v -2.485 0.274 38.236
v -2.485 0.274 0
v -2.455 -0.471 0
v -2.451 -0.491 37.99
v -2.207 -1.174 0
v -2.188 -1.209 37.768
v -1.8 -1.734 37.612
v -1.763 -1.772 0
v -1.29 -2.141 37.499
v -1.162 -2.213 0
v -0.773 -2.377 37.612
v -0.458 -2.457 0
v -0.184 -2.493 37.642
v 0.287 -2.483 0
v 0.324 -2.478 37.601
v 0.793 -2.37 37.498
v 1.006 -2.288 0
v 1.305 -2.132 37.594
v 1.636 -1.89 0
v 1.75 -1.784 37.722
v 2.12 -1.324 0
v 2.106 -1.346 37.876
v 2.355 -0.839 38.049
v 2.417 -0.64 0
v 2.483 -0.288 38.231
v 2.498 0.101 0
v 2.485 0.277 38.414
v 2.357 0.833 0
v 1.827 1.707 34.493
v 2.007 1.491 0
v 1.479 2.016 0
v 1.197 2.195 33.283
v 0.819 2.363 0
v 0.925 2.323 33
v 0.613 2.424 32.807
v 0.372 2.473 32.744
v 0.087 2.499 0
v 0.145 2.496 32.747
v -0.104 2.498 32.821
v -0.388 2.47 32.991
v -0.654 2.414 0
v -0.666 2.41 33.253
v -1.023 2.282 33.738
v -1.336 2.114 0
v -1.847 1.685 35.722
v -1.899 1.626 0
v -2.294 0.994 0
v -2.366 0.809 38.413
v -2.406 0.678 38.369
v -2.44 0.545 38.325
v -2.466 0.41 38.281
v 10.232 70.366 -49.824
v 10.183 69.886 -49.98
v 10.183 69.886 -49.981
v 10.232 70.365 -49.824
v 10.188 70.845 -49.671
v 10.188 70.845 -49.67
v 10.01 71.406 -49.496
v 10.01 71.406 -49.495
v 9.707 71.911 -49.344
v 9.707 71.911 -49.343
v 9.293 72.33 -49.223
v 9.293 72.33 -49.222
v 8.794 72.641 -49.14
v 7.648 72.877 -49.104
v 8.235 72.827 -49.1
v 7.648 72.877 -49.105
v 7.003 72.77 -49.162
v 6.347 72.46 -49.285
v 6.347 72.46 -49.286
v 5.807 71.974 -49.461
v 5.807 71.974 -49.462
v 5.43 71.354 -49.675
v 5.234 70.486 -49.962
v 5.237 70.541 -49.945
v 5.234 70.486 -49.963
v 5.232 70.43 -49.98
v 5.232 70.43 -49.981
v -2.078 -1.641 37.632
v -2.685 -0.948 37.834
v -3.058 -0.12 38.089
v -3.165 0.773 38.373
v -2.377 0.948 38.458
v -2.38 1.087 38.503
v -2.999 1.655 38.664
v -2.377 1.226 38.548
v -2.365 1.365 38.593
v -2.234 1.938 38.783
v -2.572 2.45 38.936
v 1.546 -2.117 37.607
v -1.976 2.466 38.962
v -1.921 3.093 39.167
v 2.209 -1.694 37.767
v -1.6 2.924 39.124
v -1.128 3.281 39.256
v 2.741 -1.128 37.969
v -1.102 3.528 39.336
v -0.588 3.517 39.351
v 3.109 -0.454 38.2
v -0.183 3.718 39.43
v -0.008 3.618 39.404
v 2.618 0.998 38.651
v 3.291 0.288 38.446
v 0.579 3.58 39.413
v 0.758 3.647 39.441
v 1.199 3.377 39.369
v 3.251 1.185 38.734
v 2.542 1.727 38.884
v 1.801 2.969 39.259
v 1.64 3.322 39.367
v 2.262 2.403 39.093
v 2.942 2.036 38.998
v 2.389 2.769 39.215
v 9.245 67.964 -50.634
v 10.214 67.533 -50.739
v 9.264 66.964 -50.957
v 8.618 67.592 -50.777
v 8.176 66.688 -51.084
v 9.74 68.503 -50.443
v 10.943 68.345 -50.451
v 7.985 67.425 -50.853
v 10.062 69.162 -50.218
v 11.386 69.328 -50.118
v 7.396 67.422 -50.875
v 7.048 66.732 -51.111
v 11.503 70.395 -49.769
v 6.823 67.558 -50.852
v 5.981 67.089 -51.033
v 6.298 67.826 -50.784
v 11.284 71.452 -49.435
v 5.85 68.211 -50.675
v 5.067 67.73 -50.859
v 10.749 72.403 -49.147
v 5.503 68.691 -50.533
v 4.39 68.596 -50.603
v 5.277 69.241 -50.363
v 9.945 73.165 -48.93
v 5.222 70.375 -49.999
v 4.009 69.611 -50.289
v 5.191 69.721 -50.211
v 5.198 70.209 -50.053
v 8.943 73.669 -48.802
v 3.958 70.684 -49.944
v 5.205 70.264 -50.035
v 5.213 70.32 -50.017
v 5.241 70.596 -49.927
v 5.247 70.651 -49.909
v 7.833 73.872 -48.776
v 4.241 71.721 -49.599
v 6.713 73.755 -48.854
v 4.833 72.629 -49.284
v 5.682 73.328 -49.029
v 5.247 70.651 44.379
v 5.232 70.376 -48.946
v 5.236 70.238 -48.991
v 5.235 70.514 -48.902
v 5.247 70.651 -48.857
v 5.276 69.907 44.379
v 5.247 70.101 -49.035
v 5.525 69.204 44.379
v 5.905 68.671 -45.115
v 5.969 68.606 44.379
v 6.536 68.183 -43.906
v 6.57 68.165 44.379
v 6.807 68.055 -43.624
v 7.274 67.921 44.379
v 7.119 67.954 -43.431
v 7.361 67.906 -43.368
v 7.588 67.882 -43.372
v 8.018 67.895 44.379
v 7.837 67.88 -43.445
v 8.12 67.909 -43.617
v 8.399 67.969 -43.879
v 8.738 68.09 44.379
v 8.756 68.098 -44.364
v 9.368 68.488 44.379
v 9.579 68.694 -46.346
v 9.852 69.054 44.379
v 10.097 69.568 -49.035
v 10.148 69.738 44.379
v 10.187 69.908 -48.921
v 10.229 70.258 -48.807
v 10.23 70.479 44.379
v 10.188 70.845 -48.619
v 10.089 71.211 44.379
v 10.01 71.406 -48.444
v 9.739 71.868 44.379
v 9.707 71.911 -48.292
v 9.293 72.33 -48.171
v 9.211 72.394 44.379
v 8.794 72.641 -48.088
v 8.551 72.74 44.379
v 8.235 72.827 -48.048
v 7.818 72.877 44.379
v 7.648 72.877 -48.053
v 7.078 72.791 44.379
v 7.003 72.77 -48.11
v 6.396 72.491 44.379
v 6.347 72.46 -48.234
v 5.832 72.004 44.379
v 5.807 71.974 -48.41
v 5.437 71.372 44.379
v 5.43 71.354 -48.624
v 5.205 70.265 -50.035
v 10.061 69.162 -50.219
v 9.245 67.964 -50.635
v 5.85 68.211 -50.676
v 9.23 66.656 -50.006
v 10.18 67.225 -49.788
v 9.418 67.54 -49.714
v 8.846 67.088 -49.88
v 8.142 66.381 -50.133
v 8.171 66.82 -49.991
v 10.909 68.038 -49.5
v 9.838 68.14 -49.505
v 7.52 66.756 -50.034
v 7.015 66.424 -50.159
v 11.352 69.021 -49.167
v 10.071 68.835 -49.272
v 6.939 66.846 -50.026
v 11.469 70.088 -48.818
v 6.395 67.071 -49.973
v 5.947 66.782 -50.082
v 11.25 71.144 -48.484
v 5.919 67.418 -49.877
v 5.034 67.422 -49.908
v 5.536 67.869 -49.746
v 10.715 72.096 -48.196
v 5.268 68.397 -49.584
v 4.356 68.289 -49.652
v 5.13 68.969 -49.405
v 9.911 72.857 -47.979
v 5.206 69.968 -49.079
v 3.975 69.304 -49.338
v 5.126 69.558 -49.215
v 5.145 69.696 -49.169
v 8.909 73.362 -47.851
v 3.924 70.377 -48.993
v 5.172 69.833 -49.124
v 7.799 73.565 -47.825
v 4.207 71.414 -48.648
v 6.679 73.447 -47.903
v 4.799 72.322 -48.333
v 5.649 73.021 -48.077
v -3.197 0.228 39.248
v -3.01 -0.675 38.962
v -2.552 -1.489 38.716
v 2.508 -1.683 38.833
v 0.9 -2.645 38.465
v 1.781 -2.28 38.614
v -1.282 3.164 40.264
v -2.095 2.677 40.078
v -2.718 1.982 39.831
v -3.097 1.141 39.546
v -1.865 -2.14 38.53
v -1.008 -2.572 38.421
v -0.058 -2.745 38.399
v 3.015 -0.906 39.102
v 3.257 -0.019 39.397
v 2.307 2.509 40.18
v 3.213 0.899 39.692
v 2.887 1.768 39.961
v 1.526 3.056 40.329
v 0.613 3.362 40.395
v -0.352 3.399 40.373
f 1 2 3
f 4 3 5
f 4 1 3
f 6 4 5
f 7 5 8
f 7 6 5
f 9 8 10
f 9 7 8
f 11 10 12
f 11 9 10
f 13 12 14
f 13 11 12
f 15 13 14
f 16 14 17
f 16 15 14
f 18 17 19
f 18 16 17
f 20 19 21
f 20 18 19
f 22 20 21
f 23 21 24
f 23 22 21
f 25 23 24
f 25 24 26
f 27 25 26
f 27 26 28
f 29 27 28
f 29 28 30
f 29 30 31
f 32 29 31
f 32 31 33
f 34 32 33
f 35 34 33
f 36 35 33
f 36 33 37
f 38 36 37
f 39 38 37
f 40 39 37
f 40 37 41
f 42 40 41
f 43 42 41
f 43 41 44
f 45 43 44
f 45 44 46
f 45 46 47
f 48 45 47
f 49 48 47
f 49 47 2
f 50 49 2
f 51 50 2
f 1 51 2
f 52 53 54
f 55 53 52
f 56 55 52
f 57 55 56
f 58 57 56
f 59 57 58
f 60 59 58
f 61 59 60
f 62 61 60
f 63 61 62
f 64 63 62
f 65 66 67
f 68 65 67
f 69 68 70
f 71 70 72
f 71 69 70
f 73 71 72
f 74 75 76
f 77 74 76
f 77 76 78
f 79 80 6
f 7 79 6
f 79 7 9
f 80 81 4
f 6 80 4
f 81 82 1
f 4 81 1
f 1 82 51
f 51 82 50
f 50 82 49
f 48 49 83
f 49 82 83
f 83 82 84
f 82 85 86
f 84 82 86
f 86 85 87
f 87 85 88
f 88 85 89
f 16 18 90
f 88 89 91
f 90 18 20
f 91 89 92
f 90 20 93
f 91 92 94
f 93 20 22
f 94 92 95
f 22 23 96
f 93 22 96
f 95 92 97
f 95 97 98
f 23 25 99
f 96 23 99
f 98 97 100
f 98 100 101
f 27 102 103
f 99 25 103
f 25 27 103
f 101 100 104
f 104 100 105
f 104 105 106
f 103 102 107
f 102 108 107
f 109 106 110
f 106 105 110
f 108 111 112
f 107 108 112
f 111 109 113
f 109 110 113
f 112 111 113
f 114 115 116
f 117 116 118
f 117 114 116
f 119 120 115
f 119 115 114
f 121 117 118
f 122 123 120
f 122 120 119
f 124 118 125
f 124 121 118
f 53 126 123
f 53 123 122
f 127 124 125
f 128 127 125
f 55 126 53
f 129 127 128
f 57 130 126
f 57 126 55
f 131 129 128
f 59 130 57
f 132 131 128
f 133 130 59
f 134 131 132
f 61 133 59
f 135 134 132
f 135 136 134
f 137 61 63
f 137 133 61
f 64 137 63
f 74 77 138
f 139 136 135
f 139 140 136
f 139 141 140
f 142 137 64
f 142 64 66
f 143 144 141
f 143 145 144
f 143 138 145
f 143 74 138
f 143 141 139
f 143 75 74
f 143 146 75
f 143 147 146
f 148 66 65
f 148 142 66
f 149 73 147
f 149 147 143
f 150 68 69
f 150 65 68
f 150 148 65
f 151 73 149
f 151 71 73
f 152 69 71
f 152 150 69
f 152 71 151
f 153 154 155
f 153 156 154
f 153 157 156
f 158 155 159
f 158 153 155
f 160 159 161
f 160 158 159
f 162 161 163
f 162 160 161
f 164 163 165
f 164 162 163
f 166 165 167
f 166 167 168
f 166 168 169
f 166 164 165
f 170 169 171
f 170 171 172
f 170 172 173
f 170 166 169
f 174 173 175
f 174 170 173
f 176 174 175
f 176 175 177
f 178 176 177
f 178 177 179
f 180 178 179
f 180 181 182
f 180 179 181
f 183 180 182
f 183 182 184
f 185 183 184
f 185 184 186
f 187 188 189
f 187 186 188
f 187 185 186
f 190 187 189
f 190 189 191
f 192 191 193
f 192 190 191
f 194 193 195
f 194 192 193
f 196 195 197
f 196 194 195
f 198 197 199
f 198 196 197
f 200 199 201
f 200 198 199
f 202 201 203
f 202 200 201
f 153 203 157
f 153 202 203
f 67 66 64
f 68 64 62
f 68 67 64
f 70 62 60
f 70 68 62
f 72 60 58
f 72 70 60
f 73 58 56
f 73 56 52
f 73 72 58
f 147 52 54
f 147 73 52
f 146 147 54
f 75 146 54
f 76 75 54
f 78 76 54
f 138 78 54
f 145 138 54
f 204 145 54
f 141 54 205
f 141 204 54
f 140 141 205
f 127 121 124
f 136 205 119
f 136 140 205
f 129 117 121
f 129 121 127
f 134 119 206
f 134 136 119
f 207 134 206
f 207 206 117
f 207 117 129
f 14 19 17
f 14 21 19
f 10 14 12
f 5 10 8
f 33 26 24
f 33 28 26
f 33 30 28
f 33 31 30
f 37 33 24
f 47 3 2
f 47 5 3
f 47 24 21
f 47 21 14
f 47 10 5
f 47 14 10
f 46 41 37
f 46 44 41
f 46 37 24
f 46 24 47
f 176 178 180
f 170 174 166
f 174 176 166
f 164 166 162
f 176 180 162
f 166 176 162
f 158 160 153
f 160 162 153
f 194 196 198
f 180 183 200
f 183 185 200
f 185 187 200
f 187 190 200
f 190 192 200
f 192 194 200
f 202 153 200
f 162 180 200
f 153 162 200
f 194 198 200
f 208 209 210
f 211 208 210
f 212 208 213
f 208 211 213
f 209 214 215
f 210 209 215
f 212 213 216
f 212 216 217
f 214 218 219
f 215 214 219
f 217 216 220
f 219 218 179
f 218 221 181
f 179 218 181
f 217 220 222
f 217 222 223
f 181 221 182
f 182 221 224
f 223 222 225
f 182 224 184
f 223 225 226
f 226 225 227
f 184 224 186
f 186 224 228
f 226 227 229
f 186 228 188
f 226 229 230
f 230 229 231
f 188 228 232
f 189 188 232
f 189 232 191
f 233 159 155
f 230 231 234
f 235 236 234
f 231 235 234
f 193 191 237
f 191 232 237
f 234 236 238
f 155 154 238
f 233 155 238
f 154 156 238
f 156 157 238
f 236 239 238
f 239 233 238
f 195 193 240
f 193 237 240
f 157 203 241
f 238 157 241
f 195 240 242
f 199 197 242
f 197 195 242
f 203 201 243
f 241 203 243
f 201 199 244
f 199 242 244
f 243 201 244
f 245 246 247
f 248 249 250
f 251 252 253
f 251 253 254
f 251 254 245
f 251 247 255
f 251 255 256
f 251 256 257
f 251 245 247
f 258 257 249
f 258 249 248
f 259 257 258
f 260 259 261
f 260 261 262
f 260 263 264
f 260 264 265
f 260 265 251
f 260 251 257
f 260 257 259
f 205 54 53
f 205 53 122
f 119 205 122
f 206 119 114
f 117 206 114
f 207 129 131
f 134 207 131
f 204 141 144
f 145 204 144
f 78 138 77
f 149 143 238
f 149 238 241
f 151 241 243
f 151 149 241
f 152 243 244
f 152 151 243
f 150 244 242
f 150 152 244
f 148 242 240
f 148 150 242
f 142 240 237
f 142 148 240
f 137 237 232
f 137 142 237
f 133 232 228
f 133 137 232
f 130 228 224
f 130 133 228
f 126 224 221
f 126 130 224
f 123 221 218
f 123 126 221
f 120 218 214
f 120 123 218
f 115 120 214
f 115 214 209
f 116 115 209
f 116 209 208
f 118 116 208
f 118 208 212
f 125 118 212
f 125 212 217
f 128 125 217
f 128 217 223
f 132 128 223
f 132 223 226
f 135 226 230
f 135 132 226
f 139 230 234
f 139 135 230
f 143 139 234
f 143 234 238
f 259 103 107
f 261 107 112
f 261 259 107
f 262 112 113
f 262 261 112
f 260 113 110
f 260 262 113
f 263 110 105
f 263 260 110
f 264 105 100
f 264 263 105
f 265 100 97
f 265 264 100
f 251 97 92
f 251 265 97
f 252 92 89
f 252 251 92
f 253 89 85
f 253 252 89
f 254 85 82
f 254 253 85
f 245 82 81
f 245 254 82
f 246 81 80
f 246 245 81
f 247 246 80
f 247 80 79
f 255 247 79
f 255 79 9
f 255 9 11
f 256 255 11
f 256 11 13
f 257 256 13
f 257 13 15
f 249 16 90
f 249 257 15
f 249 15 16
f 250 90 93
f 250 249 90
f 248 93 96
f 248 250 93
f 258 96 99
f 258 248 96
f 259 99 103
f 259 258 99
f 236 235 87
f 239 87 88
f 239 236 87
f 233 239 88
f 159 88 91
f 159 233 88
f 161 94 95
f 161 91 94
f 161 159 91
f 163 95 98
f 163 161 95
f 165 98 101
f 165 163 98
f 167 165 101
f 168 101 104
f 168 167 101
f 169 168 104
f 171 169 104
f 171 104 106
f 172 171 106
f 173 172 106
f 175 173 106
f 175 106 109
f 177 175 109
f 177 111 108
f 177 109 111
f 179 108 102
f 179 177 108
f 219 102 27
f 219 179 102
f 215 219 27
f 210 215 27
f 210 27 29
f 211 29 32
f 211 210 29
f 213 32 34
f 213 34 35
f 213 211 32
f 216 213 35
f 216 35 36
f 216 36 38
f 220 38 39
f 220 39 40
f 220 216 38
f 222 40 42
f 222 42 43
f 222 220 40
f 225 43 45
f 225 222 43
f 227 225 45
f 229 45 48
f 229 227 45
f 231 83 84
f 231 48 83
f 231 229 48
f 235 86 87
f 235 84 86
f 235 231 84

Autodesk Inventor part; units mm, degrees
ref_plane "YZ Plane" through (0, 0, 0) normal (1, 0, 0) x (0, 1, 0)
ref_plane "XZ Plane" through (0, 0, 0) normal (0, 1, 0) x (-1, 0, 0)
ref_plane "XY Plane" through (0, 0, 0) normal (0, 0, 1) x (1, 0, 0)
ref_plane "Work Plane1" through (-18.0552, 1.9841, 10) normal (0, 0, -1) x (-0.994, 0.1092, 0)
ref_plane "Work Plane4" through (0, 0, 10) normal (-0.994, 0.1092, 0) x (-0.1092, -0.994, 0)
ref_plane "Work Plane3" through (-40.2485, 19.0101, 10) normal (-0.994, 0.1092, 0) x (-0.1092, -0.994, 0)
sketch "Sketch1" plane through (0, 0, 10) normal (-0.994, 0.1092, 0) x (-0.1092, -0.994, 0)
  line L0 (0, -10) -> (0, 30)
  line L1 (0, 30) -> (-70.8011, -60.6212)
  line L2 (-70.8011, -60.6212) -> (-70.8011, 34.3788)
  line L3 (-7.1094, 32.5876) -> (7.1094, 27.4124)
  line L4 (-78.8593, -57.6883) -> (-62.7428, -63.5542)
  dimension "d0" = 40
  dimension "d1" = 115
  dimension "d2" = 38
  dimension "d3" = 95
  dimension "d4" = 38
  dimension "d6" = 70
ref_plane "Work Plane7" through (-18.0552, 1.9841, 10) normal (0, 0, -1) x (-0.994, 0.1092, 0)
sketch "Sketch3" plane through (-18.0552, 1.9841, 10) normal (0, 0, -1) x (-0.994, 0.1092, 0)
  circle A0 centre (-18.1638, 0) radius 11.5 projected
  circle A1 centre (-18.1638, 0) radius 2.5
  point P0 (-18.1638, 0)
  dimension "d7" = 5
sweep "Sweep1" add profiles "Sketch3" path "Sketch1" path curves L0 L1 L2 contours A1
ref_plane "Work Plane8" through (-22.055, 95.458, -62.5) normal (-0.994, 0.1092, 0) x (-0.1092, -0.994, 0)
sketch "Sketch4" plane through (-22.055, 95.458, -62.5) normal (-0.994, 0.1092, 0) x (-0.1092, -0.994, 0)
  line L0 (24.1767, 106.8788) -> (19.1767, 106.8788) projected
  line L1 (21.6767, 11.8788) -> (21.6767, 11.8788) projected
  line L2 (21.6767, 11.8788) -> (21.6767, 11.8788) projected
  line L3 (21.6767, 11.8788) -> (21.6767, 11.8788) projected
  line L4 (21.6767, 11.8788) -> (21.6767, 11.8788) projected
  line L5 (92.4778, 102.5) -> (92.4778, 102.5) projected
  line L6 (92.4778, 102.5) -> (92.4778, 102.5) projected
  line L7 (92.4778, 102.5) -> (92.4778, 102.5) projected
  line L8 (92.4778, 102.5) -> (92.4778, 102.5) projected
  line L9 (94.9778, 62.5) -> (89.9778, 62.5) projected
  line L10 (56.4279, -3) -> (16.4279, -3) projected
  line L11 (19.1767, 4.6182) -> (19.1767, 106.8788) projected
  line L12 (24.1767, 19.1393) -> (24.1767, 106.8788) projected
  line L13 (94.9778, 109.7605) -> (24.1767, 19.1393) projected
  line L14 (89.9778, 95.2395) -> (19.1767, 4.6182) projected
  line L15 (89.9778, 62.5) -> (89.9778, 95.2395) projected
  line L16 (94.9778, 62.5) -> (94.9778, 109.7605) projected
  line L17 (13.4434, 15.2665) -> (34.8257, 8.319)
  line L18 (34.8257, 8.319) -> (18.33, -8.9486)
  line L19 (18.33, -8.9486) -> (4.7452, 8.0853)
  line L20 (4.7452, 8.0853) -> (11.8837, 17.2222)
  line L21 (13.4434, 15.2665) -> (11.8837, 17.2222)
  line L22 (82.2165, 105.1215) -> (102.9149, 98.3962)
  line L23 (102.9149, 98.3962) -> (106.0468, 108.0351)
  line L24 (106.0468, 108.0351) -> (93.0792, 112.2485)
  line L25 (93.0792, 112.2485) -> (82.2165, 105.1215)
  point P0 (92.4778, 62.5)
  dimension "d10" = 70
  dimension "d11" = 7
  dimension "d12" = 7
extrude "Extrusion1" cut sketch "Sketch4" against normal through all contours L17 L14 L11 | L11 L14 L17 L18 L19 L20 L21 | L22 L25 L24 L23 L16 L13 | L13 L16 L22
sketch "Sketch5" plane through (7.7337, 70.3774, -49.9086) normal (0.0338, 0.3072, -0.9511) x (-0.994, 0.1092, 0)
  ellipse E0 centre (0, -0.4669) end of major axis (0, -3.1273) minor radius 2.5 (-2.4902, -0.232) -> (2.4902, -0.232) ccw projected
  ellipse E1 centre (0, 0) end of major axis (0, 2.6287) minor radius 2.5 (2.4902, -0.232) -> (-2.4902, -0.232) ccw projected
  line L0 (-2.4902, -0.1127) -> (2.4902, -0.1127) projected
  circle A0 centre (0, -0.1127) radius 3.7871
  point P0 (0, -51.9132)
extrude "Extrusion2" add sketch "Sketch5" against normal blind 1 contours E1 E0 | A0
sketch "Sketch6" plane through (0.0485, 0.4414, 39.4317) normal (-0.0338, -0.3072, 0.9511) x (0.994, -0.1092, 0)
  ellipse E0 centre (0, 0) end of major axis (0, -2.6604) minor radius 2.5 (2.4902, -0.2348) -> (-2.4902, -0.2348) ccw projected
  ellipse E1 centre (0, -0.4669) end of major axis (0, 2.1618) minor radius 2.5 (-2.4902, -0.2348) -> (2.4902, -0.2348) ccw projected
  line L0 (-2.4902, -0.1127) -> (2.4902, -0.1127) projected
  circle A0 centre (0, -0.1127) radius 3.2394
  point P0 (0, -12.6073)
extrude "Extrusion3" add sketch "Sketch6" against normal blind 1 contours E1 E0 | A0
ref_plane "Work Plane2" through (-1.6385, -14.9102, 10) normal (0, 0, 1) x (0.994, -0.1092, 0)
properties part number "cellSTORM_lightpath"
